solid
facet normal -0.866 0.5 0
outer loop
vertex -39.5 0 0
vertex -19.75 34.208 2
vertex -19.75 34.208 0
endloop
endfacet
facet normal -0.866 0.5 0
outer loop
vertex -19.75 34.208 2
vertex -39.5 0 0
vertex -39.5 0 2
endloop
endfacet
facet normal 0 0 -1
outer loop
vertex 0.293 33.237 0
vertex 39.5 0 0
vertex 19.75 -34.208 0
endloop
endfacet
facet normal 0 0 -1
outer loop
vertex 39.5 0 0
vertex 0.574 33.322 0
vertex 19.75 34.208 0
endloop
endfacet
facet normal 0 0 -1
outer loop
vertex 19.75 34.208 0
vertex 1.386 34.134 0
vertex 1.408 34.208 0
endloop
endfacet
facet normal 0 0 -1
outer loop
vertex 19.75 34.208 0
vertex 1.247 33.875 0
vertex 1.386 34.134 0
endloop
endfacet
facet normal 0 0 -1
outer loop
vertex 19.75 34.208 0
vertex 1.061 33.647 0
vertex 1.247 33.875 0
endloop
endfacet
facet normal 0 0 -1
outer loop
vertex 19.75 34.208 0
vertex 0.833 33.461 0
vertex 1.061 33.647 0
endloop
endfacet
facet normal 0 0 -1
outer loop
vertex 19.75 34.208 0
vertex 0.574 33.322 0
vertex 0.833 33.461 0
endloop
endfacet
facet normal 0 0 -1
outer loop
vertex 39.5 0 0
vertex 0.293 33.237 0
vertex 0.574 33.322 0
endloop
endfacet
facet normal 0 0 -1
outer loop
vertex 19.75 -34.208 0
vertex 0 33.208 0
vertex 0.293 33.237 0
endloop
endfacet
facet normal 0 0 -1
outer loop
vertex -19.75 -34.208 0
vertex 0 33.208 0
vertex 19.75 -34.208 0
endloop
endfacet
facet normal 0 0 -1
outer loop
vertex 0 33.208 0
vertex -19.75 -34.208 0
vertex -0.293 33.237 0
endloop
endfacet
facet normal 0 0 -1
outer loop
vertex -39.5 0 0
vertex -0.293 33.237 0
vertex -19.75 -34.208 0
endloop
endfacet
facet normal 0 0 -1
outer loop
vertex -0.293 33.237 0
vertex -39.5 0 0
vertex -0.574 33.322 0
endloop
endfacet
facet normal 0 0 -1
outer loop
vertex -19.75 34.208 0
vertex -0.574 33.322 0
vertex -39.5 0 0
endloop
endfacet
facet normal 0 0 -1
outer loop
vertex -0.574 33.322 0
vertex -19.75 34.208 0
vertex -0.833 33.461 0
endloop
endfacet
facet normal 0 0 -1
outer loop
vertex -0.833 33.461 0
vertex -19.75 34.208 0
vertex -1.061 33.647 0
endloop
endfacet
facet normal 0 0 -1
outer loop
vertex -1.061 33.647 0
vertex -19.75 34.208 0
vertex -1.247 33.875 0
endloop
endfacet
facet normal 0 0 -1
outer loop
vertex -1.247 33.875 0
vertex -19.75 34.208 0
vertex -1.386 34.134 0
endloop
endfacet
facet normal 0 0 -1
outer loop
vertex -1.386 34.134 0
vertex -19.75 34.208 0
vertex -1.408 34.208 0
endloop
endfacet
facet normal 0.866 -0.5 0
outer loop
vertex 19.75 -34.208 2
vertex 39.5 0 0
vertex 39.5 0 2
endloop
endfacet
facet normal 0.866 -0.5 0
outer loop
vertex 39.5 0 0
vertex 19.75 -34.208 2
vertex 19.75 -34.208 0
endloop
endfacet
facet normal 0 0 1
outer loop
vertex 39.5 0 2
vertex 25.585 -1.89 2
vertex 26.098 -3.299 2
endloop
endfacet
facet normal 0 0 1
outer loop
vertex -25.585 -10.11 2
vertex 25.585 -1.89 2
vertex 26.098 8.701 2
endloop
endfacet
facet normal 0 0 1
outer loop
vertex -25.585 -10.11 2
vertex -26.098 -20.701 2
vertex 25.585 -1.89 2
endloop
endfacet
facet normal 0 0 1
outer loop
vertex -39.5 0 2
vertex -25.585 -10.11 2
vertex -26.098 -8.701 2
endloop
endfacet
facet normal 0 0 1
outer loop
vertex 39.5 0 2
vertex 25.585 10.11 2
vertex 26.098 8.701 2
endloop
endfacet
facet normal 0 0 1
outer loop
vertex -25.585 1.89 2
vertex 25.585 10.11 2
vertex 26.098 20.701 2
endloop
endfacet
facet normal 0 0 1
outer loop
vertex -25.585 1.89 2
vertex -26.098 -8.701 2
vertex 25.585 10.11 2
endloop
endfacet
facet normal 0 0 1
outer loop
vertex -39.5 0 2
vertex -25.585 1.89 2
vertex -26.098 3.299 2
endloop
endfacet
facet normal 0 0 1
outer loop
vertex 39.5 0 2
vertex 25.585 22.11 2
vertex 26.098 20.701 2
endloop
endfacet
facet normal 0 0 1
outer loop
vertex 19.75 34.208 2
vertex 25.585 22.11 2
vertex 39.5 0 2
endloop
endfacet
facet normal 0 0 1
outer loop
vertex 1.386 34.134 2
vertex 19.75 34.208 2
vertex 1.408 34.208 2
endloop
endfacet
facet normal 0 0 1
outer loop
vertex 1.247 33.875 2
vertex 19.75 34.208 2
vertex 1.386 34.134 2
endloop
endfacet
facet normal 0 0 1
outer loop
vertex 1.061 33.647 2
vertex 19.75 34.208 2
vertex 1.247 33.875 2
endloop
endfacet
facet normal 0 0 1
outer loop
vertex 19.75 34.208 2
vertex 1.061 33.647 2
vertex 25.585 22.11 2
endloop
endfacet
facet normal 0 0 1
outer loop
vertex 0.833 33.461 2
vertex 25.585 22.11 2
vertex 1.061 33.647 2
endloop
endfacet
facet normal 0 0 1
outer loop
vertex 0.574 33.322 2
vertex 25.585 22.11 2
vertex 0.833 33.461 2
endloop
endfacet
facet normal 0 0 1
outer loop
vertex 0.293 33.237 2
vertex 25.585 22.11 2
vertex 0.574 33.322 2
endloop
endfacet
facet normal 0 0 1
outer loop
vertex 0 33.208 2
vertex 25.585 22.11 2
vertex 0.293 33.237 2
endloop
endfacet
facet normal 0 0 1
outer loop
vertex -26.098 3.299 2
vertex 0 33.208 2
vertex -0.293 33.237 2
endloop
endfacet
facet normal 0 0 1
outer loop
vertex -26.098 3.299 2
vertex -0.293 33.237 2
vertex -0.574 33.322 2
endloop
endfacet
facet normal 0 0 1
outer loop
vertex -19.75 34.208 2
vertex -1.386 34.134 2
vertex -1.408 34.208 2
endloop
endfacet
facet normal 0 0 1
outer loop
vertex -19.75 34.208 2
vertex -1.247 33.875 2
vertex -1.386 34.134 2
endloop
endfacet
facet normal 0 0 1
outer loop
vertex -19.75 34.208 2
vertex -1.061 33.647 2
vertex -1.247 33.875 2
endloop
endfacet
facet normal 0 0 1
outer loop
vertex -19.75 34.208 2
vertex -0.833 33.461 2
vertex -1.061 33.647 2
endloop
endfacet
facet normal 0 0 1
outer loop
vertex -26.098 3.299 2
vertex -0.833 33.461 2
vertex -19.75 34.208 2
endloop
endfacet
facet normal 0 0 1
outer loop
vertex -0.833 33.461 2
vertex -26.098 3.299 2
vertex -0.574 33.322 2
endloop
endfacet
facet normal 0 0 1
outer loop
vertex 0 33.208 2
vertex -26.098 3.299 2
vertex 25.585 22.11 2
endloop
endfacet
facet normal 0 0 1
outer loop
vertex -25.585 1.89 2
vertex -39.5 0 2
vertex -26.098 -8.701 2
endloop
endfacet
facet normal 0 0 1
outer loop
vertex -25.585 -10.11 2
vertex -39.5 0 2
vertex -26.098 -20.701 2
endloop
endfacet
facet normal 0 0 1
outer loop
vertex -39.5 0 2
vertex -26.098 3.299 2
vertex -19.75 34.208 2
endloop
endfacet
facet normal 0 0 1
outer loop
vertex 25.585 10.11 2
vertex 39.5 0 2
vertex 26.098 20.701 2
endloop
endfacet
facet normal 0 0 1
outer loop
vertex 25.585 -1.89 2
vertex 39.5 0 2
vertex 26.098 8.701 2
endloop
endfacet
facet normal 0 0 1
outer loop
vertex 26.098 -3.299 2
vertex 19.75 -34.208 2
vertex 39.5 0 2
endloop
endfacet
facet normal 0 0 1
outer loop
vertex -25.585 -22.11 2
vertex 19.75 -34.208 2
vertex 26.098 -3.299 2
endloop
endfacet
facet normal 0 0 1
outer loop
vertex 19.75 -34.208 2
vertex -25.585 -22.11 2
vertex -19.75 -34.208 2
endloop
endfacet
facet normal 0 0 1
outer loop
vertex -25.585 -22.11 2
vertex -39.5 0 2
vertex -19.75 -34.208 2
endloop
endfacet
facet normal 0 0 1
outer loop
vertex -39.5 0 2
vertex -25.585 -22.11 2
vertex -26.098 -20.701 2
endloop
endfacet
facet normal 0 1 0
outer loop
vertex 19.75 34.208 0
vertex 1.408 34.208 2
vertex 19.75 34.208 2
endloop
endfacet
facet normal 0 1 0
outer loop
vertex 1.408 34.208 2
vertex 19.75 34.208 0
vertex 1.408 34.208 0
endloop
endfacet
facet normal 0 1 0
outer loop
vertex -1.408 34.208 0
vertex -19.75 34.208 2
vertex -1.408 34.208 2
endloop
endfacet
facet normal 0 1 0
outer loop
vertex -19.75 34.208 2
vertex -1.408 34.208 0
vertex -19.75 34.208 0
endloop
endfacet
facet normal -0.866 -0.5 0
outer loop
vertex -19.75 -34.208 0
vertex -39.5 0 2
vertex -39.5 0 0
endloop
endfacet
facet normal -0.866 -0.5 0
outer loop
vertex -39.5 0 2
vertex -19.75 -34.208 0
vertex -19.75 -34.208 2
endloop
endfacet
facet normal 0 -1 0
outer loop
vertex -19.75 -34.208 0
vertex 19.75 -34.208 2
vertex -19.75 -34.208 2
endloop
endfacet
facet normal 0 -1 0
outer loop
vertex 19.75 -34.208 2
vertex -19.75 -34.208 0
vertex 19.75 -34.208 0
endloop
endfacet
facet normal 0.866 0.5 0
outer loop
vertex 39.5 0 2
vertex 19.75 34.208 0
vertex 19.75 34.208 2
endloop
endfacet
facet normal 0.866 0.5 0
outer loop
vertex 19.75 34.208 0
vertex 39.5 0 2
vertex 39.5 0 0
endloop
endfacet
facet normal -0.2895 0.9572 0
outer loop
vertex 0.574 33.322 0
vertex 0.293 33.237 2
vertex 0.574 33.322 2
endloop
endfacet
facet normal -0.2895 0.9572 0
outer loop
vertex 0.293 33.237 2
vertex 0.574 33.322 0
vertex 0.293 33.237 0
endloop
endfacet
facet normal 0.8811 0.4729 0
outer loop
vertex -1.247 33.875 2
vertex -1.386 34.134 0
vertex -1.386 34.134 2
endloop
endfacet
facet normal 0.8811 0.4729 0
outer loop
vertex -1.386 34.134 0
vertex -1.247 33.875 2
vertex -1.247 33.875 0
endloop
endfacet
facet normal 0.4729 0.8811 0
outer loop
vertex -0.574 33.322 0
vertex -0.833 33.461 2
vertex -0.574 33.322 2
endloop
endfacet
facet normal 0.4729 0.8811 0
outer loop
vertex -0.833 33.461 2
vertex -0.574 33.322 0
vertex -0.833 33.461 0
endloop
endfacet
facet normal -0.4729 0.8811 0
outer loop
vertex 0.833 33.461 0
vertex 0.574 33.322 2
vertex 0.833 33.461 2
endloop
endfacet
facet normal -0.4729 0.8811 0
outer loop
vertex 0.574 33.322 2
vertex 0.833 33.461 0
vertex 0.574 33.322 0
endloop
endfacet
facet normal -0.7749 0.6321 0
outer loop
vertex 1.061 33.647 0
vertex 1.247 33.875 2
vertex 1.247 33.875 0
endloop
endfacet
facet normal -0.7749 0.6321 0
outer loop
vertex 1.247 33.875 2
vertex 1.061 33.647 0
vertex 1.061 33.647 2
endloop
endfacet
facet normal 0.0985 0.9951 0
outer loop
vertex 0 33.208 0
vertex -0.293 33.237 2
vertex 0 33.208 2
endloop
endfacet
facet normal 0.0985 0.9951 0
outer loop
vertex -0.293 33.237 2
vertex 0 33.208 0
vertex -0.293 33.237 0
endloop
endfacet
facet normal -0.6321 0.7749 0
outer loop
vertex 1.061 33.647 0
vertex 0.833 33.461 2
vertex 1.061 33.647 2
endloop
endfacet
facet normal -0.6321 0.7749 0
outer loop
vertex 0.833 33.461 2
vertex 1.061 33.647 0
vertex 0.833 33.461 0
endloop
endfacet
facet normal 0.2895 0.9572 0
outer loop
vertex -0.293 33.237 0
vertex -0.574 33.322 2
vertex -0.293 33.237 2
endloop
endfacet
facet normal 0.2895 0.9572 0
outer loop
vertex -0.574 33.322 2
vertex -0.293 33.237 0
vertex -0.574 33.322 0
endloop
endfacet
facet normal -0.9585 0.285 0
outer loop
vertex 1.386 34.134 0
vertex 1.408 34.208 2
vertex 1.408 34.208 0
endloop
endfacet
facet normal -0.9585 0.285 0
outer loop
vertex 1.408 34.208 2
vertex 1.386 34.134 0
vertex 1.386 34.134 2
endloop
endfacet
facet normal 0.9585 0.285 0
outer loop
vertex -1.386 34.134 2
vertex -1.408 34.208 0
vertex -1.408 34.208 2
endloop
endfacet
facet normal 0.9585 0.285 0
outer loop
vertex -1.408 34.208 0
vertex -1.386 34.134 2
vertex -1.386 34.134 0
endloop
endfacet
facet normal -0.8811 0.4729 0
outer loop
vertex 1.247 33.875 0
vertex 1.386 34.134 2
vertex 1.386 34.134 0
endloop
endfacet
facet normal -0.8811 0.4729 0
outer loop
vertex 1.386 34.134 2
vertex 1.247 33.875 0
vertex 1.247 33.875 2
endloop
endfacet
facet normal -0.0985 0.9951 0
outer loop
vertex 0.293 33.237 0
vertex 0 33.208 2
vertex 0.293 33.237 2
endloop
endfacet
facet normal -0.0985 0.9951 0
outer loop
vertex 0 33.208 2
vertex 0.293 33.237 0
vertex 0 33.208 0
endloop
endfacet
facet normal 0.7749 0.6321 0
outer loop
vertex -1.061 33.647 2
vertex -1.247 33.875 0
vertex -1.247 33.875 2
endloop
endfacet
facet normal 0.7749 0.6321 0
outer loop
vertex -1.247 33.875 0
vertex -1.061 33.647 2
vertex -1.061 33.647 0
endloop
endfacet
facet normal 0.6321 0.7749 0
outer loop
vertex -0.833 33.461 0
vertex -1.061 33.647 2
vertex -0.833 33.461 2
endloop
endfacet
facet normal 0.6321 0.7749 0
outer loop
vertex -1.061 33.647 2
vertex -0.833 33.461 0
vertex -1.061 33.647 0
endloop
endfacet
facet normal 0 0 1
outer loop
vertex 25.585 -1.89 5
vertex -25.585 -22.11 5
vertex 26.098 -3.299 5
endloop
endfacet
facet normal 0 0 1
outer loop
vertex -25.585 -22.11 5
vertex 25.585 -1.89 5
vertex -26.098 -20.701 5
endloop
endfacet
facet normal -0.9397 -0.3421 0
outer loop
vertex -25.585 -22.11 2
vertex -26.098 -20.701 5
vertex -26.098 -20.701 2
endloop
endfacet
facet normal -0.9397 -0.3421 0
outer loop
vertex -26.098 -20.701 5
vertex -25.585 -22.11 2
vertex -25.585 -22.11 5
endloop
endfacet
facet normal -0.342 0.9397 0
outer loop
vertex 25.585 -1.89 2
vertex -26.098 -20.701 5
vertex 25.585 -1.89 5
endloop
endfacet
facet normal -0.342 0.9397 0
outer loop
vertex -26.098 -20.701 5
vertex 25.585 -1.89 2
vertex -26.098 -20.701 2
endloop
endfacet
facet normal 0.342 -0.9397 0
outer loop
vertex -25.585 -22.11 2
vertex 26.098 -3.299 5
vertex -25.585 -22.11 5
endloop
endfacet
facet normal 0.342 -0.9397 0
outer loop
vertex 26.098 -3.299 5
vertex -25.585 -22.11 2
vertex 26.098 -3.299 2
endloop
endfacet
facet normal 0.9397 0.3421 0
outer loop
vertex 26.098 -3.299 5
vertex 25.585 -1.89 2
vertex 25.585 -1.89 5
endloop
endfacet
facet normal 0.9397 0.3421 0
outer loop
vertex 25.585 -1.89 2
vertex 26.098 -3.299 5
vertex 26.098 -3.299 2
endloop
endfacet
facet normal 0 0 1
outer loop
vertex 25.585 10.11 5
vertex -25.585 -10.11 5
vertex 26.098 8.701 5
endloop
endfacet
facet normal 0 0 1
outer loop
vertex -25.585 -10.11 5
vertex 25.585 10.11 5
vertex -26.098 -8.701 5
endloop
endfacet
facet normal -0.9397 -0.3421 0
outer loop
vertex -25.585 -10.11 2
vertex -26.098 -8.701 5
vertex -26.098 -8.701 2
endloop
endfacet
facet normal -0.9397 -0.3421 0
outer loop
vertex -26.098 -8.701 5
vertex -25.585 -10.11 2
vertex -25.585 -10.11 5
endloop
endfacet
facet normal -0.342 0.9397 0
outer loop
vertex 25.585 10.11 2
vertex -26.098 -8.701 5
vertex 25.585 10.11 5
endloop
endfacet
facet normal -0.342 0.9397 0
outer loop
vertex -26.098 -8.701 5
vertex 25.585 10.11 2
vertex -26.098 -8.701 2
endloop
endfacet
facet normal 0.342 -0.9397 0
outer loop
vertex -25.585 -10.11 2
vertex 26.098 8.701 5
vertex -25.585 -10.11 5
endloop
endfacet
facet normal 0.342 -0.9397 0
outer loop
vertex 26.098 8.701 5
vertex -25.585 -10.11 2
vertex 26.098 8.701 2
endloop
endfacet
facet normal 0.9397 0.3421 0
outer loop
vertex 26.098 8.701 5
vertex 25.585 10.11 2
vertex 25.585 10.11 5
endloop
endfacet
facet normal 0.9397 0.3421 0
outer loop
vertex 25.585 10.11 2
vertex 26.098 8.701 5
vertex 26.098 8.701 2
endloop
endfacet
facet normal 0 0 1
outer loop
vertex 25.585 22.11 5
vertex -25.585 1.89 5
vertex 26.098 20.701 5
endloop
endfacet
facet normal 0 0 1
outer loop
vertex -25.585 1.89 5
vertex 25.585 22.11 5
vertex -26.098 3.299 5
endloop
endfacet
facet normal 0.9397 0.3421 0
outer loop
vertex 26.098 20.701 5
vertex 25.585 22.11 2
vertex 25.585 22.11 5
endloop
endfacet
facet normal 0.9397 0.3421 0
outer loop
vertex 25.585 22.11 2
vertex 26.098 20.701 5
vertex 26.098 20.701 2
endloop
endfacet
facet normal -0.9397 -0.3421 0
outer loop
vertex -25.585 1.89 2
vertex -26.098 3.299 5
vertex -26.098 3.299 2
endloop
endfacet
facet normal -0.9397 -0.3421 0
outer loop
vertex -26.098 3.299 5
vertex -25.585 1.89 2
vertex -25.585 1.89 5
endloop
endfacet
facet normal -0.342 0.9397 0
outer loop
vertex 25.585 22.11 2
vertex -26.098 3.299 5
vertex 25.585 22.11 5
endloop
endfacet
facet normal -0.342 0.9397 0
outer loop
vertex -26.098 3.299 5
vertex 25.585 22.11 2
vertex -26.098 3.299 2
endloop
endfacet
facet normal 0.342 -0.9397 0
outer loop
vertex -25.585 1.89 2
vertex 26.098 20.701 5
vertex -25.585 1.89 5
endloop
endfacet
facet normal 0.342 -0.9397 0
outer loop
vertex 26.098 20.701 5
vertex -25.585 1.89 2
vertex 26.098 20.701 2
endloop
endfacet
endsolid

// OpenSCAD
// Baffle Insert V3
// Print: Flat on bed, enable FUZZY SKIN, PETG
// Estimated: ~20-30 min, ~10g PETG

INSERT_SIZE = 79;
INSERT_THICKNESS = 2;
FIN_HEIGHT = 3;
FIN_LENGTH = 55;
FIN_THICKNESS = 1.5;
FIN_ANGLE = 20;
FIN_OFFSETS = [-12, 0, 12];
FILL_PORT_D = 3;

module hex_prism(size, height) {
    r = size / 2;
    linear_extrude(height = height, center = false)
        polygon([for (a = [0 : 60 : 300]) [r * cos(a), r * sin(a)]]);
}

difference() {
    hex_prism(INSERT_SIZE, INSERT_THICKNESS);
    translate([0, INSERT_SIZE/2 * cos(30) + 0.5, -0.01])
        cylinder(h = INSERT_THICKNESS + 0.02, d = FILL_PORT_D, $fn = 32);
}

for (offset = FIN_OFFSETS) {
    translate([0, offset, INSERT_THICKNESS])
        rotate([0, 0, FIN_ANGLE])
            translate([-FIN_LENGTH/2, -FIN_THICKNESS/2, 0])
                cube([FIN_LENGTH, FIN_THICKNESS, FIN_HEIGHT]);
}
